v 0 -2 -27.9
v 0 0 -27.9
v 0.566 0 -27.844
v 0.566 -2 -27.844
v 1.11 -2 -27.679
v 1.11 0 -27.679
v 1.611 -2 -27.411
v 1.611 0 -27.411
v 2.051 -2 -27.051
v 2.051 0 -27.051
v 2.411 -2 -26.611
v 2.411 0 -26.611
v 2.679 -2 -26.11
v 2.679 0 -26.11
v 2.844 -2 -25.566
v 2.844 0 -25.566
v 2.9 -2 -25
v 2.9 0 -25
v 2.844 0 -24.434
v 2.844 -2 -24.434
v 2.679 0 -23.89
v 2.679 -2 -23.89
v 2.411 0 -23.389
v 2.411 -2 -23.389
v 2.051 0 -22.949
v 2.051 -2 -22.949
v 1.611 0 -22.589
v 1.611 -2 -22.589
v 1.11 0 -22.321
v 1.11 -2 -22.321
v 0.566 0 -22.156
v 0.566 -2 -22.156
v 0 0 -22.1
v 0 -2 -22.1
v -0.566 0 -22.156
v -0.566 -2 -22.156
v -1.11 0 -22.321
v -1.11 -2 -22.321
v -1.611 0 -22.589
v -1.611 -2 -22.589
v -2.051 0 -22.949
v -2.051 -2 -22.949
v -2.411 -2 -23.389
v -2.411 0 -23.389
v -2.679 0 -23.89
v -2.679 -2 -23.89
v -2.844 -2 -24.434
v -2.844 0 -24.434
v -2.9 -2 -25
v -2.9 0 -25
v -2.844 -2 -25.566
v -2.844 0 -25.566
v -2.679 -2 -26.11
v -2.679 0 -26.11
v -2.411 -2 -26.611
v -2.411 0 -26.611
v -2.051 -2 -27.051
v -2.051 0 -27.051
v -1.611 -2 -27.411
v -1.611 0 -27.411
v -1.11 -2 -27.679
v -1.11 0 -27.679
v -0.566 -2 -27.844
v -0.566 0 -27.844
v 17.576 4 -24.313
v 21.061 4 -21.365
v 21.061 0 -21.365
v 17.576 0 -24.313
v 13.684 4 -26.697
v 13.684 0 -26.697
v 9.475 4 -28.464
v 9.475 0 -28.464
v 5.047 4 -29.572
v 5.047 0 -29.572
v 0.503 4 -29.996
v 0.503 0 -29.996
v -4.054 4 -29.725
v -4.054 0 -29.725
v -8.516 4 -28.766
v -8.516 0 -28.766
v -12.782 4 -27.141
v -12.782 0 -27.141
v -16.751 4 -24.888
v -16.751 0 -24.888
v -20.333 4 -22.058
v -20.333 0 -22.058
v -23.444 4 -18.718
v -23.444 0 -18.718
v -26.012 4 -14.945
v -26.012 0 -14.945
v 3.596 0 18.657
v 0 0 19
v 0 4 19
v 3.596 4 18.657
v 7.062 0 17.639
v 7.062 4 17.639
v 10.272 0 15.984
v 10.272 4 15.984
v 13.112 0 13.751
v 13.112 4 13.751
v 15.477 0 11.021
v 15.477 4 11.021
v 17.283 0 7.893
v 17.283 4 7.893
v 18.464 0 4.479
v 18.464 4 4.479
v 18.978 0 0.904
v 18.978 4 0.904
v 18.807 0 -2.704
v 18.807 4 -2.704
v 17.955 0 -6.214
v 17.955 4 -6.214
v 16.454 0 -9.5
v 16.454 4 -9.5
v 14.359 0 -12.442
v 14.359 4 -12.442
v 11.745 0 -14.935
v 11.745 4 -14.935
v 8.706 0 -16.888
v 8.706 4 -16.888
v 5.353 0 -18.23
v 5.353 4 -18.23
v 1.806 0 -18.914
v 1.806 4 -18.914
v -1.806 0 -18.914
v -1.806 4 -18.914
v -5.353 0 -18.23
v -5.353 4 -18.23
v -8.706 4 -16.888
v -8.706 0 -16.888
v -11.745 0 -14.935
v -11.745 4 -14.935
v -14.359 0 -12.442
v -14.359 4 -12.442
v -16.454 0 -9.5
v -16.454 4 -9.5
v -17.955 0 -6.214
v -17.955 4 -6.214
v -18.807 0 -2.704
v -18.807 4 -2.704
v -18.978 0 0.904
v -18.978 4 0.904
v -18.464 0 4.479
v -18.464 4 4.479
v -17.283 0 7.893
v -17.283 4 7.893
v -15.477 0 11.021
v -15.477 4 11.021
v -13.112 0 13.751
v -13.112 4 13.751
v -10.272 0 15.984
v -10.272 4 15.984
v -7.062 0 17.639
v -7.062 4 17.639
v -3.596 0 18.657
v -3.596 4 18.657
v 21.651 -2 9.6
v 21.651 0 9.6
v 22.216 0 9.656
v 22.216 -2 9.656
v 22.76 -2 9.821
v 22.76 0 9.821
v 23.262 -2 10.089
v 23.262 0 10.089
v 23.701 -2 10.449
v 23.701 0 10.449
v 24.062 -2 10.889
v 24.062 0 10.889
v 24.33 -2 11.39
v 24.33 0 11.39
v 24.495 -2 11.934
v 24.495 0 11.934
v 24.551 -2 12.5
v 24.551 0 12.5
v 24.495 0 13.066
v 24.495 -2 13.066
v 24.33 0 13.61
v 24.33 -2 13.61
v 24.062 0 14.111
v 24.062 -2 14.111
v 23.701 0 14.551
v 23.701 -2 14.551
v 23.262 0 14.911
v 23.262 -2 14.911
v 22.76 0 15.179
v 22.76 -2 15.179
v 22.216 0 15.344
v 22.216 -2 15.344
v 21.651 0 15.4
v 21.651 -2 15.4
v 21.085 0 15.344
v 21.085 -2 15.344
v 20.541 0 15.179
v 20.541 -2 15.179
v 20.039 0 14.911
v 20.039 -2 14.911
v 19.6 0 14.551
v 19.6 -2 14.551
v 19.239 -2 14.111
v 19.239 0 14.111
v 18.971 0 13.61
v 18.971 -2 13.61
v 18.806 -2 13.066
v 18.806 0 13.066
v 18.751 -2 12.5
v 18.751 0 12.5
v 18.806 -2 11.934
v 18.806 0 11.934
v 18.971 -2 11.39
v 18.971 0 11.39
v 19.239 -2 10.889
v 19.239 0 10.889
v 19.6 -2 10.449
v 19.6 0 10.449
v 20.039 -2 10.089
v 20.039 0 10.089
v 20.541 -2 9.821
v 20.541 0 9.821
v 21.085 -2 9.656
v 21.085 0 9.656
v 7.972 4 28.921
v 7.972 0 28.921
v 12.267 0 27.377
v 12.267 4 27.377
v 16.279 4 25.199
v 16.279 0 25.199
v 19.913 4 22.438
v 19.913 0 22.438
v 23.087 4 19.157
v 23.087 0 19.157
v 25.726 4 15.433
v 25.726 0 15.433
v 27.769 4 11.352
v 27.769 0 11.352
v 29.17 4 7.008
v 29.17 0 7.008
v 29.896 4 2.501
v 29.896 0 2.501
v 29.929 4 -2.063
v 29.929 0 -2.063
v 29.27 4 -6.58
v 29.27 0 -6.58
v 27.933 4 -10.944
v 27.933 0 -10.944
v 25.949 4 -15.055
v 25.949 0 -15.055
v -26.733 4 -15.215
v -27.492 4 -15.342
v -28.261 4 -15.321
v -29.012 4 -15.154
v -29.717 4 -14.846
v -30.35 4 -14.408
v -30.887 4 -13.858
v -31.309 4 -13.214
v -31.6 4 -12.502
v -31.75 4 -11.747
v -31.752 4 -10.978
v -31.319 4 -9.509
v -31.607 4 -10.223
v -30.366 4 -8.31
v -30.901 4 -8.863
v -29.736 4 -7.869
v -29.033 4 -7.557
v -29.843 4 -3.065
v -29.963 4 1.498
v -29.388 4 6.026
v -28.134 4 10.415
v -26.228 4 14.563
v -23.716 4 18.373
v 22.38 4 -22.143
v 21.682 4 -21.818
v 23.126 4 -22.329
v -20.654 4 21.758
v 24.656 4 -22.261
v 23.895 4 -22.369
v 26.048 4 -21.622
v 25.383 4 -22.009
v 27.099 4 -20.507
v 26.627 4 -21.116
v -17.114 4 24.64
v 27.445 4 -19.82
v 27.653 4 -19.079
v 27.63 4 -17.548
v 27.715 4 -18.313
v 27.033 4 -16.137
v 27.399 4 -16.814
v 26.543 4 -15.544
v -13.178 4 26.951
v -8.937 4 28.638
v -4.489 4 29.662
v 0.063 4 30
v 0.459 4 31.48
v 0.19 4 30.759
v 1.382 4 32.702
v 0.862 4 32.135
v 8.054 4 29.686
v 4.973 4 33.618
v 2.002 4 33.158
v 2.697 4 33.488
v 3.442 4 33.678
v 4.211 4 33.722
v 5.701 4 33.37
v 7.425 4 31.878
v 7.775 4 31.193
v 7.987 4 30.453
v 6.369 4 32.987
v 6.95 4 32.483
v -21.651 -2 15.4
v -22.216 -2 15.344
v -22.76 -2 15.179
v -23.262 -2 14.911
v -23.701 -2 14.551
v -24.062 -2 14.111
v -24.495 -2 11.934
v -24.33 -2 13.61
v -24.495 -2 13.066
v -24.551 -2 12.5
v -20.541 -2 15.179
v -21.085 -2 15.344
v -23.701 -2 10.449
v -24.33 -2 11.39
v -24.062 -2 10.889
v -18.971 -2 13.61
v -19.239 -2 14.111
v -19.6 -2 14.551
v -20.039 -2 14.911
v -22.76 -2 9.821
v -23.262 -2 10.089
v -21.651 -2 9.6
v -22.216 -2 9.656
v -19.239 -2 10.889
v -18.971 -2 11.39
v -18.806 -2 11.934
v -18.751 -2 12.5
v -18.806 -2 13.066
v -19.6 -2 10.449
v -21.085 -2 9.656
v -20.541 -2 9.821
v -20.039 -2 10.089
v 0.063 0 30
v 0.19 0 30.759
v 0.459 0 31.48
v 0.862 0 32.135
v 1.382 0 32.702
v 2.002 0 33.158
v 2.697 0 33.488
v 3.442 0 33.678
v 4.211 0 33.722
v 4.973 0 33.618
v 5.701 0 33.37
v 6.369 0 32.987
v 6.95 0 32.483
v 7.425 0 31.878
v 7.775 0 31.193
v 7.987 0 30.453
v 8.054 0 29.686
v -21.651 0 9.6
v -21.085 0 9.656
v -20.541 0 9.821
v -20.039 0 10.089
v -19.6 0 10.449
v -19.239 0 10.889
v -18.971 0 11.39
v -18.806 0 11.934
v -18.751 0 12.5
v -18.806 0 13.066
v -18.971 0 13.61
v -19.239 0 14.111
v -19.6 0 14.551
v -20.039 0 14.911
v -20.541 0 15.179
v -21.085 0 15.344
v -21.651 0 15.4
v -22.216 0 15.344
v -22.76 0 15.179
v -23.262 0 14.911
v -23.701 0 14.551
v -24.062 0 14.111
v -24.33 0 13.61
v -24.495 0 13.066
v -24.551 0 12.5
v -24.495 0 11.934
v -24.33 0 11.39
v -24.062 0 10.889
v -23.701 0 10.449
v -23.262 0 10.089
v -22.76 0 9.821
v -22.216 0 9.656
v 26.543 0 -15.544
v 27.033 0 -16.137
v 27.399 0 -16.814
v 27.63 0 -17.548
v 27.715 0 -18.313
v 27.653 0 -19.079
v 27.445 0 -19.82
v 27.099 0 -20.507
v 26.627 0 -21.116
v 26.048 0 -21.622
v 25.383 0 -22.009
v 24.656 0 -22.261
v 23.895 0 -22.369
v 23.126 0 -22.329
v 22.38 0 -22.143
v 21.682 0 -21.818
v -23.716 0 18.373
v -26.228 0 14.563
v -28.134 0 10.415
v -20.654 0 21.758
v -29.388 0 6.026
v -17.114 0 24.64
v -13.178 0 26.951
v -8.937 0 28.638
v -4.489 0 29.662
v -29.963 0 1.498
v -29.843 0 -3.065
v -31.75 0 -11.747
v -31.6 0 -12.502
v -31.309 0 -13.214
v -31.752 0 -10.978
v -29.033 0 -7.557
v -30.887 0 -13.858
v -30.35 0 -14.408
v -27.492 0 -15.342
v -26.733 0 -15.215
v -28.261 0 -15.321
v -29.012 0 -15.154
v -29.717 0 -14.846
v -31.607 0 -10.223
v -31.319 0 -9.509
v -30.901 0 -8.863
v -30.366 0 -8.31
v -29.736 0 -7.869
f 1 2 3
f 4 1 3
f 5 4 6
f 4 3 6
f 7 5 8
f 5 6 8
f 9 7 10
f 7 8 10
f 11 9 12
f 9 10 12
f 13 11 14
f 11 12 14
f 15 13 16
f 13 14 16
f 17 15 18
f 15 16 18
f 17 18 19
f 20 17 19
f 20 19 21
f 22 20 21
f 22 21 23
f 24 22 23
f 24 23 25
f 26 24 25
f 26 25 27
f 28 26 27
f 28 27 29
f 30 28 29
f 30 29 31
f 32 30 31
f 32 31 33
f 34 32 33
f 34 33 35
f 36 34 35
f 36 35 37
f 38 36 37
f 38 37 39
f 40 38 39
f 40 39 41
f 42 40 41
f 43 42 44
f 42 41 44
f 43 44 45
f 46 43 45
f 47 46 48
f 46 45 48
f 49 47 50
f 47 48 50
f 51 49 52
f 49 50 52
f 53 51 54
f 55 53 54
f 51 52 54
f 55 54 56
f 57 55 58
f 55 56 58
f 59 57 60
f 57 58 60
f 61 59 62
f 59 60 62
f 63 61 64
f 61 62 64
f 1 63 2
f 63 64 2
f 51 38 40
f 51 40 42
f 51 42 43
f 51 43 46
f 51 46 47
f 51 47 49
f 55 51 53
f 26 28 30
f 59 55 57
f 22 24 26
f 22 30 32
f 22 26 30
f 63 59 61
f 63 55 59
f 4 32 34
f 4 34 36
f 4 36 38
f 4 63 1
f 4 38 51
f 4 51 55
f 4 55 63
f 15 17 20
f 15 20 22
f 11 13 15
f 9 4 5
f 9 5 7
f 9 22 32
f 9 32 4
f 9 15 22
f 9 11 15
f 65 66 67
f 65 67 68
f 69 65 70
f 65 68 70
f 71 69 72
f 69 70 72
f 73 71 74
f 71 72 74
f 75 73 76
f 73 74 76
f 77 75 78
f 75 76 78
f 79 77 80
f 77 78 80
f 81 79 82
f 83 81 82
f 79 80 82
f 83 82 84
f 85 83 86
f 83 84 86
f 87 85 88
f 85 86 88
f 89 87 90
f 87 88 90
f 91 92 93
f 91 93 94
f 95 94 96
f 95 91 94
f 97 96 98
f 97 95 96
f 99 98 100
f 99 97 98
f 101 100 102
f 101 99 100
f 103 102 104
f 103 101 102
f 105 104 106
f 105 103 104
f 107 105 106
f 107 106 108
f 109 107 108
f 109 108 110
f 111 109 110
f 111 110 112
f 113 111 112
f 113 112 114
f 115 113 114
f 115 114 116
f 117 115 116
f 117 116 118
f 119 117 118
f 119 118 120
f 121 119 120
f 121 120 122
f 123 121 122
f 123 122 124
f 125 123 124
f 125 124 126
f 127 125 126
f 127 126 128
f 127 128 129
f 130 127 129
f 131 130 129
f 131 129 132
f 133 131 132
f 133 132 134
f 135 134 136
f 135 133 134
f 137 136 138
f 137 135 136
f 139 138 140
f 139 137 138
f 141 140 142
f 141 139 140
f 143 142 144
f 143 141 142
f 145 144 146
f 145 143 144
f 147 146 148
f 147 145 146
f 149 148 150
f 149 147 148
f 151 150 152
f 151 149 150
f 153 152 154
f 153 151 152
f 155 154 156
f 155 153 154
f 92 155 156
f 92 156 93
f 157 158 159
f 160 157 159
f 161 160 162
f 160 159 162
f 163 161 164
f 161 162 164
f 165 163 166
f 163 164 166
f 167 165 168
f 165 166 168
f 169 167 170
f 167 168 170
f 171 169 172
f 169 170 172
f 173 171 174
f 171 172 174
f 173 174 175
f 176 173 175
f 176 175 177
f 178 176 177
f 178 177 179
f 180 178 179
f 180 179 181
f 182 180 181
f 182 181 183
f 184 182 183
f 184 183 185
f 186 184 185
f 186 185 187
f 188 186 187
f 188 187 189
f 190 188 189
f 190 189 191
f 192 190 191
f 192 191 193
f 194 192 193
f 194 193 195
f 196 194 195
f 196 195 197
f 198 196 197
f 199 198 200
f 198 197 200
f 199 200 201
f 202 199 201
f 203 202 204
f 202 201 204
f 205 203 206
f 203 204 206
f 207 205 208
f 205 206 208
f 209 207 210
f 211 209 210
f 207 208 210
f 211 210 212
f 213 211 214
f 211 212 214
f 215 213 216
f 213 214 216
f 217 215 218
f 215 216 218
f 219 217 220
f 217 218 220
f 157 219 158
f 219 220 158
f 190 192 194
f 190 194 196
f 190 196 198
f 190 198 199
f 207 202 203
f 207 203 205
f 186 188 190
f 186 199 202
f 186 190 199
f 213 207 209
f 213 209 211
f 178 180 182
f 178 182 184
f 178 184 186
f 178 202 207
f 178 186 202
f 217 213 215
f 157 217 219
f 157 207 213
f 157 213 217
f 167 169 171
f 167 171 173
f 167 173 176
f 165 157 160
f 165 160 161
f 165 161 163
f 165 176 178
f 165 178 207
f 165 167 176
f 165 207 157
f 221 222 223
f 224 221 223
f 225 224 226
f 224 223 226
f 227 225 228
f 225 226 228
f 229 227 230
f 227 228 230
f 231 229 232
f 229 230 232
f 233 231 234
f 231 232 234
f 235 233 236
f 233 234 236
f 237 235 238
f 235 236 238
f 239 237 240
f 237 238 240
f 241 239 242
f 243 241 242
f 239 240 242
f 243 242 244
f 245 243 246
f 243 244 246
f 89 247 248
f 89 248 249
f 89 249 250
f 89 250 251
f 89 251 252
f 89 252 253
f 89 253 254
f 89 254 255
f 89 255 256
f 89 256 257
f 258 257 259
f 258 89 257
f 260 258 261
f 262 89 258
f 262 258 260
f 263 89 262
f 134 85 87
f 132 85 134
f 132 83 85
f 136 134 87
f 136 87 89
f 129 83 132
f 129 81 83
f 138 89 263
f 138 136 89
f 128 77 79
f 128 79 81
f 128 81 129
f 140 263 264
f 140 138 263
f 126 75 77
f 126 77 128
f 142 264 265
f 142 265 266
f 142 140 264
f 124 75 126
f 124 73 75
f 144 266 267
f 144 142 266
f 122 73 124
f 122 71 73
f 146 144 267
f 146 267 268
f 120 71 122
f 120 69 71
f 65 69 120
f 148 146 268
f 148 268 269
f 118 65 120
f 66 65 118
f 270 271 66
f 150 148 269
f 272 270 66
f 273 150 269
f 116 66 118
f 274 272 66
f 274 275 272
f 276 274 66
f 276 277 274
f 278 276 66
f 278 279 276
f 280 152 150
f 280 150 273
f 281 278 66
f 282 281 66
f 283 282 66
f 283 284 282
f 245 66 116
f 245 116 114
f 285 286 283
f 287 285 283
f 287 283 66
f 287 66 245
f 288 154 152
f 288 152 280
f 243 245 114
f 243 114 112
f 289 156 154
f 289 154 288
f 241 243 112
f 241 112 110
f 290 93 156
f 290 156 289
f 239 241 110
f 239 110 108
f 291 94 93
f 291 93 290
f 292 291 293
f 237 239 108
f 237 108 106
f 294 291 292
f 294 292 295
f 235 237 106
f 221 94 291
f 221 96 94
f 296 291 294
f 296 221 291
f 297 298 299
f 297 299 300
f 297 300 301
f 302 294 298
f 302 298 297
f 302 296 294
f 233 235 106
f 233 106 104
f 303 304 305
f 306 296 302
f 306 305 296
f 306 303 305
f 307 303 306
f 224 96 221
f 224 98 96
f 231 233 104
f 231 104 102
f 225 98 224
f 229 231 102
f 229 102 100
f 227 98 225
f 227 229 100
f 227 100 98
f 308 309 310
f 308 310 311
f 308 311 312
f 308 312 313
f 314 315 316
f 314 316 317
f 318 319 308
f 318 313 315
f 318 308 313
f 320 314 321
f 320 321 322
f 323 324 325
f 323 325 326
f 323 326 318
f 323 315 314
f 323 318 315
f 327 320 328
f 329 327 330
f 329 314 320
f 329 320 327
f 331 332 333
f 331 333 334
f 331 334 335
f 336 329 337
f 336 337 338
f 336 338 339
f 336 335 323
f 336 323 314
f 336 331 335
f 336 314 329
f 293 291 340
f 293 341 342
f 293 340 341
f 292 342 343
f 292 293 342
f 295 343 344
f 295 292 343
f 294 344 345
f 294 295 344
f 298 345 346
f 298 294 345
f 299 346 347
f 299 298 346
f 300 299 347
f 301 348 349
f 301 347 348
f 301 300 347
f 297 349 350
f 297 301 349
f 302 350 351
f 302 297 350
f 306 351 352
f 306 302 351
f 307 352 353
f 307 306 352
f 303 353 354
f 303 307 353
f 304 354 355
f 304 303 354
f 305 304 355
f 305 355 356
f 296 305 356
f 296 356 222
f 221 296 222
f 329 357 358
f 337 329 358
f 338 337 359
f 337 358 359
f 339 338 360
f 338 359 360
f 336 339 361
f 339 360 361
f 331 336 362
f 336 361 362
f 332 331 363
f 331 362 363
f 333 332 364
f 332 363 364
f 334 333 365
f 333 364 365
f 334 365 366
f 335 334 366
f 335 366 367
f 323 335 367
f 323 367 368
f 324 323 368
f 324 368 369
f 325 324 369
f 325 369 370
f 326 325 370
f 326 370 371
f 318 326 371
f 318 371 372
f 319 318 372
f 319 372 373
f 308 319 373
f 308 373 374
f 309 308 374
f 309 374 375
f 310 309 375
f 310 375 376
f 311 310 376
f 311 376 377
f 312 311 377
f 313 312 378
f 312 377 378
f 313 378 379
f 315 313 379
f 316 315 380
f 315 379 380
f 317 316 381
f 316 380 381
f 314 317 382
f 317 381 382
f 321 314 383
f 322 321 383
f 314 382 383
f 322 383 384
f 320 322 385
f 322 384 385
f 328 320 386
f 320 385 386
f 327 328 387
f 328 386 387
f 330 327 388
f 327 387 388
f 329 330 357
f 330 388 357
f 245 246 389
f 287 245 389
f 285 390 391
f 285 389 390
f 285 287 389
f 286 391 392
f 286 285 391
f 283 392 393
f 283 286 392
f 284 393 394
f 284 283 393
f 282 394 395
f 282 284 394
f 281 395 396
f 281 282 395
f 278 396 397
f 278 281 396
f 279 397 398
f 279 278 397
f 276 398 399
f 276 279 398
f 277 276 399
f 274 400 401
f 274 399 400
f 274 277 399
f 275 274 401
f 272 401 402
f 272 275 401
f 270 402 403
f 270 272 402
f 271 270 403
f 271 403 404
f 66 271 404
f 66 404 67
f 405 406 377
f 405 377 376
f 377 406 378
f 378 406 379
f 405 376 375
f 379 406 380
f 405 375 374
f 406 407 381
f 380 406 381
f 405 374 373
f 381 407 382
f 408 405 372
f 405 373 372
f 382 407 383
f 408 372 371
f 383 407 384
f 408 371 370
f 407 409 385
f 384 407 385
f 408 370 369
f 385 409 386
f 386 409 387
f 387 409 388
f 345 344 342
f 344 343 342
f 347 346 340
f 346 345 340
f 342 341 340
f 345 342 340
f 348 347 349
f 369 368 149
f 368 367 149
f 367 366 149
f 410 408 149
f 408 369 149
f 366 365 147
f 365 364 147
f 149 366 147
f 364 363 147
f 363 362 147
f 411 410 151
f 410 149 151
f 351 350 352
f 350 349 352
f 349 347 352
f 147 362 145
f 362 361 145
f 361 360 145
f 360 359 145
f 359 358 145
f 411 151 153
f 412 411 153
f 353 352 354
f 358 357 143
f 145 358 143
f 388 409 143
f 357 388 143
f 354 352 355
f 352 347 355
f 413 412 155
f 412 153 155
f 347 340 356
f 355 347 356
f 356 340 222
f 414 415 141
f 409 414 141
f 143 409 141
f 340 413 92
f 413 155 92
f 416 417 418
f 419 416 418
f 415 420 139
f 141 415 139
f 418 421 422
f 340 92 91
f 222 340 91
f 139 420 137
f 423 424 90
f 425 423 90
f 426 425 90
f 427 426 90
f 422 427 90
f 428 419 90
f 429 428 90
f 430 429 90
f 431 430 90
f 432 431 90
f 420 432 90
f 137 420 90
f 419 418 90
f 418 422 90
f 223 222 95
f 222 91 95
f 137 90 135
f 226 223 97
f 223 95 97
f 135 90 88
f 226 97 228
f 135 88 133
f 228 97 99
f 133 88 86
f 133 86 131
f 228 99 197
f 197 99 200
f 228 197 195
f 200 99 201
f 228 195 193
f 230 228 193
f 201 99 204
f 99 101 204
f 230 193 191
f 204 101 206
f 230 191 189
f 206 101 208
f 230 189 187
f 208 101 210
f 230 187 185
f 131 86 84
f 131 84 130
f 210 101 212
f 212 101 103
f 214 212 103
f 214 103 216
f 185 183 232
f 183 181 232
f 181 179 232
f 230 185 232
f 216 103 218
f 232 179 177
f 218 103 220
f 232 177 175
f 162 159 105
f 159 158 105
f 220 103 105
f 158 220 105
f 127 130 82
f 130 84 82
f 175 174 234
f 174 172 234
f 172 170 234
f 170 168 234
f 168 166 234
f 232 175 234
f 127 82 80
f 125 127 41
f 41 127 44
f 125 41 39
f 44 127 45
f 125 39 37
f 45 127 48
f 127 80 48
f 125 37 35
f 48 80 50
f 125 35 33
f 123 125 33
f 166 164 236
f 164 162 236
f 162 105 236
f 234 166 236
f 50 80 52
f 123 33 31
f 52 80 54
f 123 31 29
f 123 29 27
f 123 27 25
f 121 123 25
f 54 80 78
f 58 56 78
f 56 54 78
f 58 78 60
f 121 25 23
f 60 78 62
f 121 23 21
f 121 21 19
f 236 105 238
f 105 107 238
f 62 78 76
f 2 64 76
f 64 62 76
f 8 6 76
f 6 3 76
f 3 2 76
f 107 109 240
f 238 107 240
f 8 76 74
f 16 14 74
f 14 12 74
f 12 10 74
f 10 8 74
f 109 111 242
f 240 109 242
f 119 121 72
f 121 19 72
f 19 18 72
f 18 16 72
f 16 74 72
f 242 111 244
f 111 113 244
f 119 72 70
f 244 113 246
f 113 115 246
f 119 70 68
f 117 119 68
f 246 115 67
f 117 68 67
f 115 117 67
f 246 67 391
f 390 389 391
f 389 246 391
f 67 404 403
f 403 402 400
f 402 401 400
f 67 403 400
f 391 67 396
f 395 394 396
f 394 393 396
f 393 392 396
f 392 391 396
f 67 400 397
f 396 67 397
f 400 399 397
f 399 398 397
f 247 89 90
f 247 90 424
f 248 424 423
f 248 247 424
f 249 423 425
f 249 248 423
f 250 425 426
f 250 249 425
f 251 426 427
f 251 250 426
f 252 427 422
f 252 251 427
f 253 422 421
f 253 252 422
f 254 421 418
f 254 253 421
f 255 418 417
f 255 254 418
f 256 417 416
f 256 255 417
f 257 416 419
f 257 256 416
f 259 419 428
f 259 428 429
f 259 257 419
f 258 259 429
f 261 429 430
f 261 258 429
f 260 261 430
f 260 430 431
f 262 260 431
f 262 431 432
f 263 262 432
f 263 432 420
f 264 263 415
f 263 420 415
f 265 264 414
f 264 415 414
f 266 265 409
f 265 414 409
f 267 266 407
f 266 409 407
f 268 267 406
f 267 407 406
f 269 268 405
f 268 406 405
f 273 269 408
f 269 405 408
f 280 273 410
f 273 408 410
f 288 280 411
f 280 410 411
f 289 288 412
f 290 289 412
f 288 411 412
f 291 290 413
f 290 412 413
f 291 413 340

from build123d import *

# Parameters (mm, degrees)
SKETCH1_R                = 19
BOSS_EXTRUDE1_DEPTH      = 3.5
SKETCH2_R                = 30
SKETCH2_R_2              = 19
SKETCH2_R_3              = 2.8
BOSS_EXTRUDE2_DEPTH      = 4
CUT_EXTRUDE1_START       = -10
SKETCH3_R                = 19
CUT_EXTRUDE1_DEPTH       = 10
BOSS_EXTRUDE3_DEPTH      = 2
BOSS_EXTRUDE3_DEPTH_BACK = 4
SKETCH4_R                = 2.9
SKETCH5_R                = 4
BOSS_EXTRUDE4_DEPTH      = 4


with BuildPart() as part:
    # Sketch1 → Boss-Extrude1 (new body)
    with BuildSketch(Plane(origin=(0, 0, 0), x_dir=(1, 0, 0), z_dir=(0, 1, 0))):
        with Locations(Location((0, 0, 0), (0, 0, 270))):
            Circle(SKETCH1_R)
    extrude(amount=BOSS_EXTRUDE1_DEPTH)

    # Sketch2 → Boss-Extrude2 (add)
    with BuildSketch(Plane(origin=(0, 0, 0), x_dir=(1, 0, 0), z_dir=(0, 1, 0))):
        with Locations(Location((0, 0, 0), (0, 0, 270))):
            Circle(SKETCH2_R)
        with Locations(Location((0, 0, 0), (0, 0, 270))):
            Circle(SKETCH2_R_2, mode=Mode.SUBTRACT)
        with Locations(Location((0, 25, 0), (0, 0, 270))):
            Circle(SKETCH2_R_3, mode=Mode.SUBTRACT)
        with Locations(Location((21.650635095, -12.5, 0), (0, 0, 270))):
            Circle(SKETCH2_R_3, mode=Mode.SUBTRACT)
        with Locations(Location((-21.650635095, -12.5, 0), (0, 0, 270))):
            Circle(SKETCH2_R_3, mode=Mode.SUBTRACT)
    extrude(amount=BOSS_EXTRUDE2_DEPTH)

    # Sketch3 → Cut-Extrude1 (cut)
    with BuildSketch(Plane(origin=(0, 3.5, 0), x_dir=(1, 0, 0), z_dir=(0, 1, 0)).offset(CUT_EXTRUDE1_START)):
        with Locations(Location((0, 0, 0), (0, 0, 270))):
            Circle(SKETCH3_R)
    extrude(amount=CUT_EXTRUDE1_DEPTH, mode=Mode.SUBTRACT)

    # Sketch4 → Boss-Extrude3 (add, two sides: drawn at the far end of the back side and taken through both)
    with BuildSketch(Plane.XZ.offset(-BOSS_EXTRUDE3_DEPTH_BACK)):
        with Locations(Location((-21.650635095, 12.5, 0), (0, 0, 270))):
            Circle(SKETCH4_R)
        with Locations(Location((21.650635095, 12.5, 0), (0, 0, 270))):
            Circle(SKETCH4_R)
        with Locations(Location((0, -25, 0), (0, 0, 270))):
            Circle(SKETCH4_R)
    extrude(amount=BOSS_EXTRUDE3_DEPTH + BOSS_EXTRUDE3_DEPTH_BACK)

    # Sketch5 → Boss-Extrude4 (add)
    with BuildSketch(Plane(origin=(0, 4, 0), x_dir=(1, 0, 0), z_dir=(0, 1, 0))):
        with Locations((-27.769349467, 11.35179414)):
            Circle(SKETCH5_R)
        with Locations((23.715616837, 18.373065015)):
            Circle(SKETCH5_R)
        with Locations((4.05373263, -29.724859155)):
            Circle(SKETCH5_R)
    extrude(amount=-BOSS_EXTRUDE4_DEPTH)


solid = part.part
